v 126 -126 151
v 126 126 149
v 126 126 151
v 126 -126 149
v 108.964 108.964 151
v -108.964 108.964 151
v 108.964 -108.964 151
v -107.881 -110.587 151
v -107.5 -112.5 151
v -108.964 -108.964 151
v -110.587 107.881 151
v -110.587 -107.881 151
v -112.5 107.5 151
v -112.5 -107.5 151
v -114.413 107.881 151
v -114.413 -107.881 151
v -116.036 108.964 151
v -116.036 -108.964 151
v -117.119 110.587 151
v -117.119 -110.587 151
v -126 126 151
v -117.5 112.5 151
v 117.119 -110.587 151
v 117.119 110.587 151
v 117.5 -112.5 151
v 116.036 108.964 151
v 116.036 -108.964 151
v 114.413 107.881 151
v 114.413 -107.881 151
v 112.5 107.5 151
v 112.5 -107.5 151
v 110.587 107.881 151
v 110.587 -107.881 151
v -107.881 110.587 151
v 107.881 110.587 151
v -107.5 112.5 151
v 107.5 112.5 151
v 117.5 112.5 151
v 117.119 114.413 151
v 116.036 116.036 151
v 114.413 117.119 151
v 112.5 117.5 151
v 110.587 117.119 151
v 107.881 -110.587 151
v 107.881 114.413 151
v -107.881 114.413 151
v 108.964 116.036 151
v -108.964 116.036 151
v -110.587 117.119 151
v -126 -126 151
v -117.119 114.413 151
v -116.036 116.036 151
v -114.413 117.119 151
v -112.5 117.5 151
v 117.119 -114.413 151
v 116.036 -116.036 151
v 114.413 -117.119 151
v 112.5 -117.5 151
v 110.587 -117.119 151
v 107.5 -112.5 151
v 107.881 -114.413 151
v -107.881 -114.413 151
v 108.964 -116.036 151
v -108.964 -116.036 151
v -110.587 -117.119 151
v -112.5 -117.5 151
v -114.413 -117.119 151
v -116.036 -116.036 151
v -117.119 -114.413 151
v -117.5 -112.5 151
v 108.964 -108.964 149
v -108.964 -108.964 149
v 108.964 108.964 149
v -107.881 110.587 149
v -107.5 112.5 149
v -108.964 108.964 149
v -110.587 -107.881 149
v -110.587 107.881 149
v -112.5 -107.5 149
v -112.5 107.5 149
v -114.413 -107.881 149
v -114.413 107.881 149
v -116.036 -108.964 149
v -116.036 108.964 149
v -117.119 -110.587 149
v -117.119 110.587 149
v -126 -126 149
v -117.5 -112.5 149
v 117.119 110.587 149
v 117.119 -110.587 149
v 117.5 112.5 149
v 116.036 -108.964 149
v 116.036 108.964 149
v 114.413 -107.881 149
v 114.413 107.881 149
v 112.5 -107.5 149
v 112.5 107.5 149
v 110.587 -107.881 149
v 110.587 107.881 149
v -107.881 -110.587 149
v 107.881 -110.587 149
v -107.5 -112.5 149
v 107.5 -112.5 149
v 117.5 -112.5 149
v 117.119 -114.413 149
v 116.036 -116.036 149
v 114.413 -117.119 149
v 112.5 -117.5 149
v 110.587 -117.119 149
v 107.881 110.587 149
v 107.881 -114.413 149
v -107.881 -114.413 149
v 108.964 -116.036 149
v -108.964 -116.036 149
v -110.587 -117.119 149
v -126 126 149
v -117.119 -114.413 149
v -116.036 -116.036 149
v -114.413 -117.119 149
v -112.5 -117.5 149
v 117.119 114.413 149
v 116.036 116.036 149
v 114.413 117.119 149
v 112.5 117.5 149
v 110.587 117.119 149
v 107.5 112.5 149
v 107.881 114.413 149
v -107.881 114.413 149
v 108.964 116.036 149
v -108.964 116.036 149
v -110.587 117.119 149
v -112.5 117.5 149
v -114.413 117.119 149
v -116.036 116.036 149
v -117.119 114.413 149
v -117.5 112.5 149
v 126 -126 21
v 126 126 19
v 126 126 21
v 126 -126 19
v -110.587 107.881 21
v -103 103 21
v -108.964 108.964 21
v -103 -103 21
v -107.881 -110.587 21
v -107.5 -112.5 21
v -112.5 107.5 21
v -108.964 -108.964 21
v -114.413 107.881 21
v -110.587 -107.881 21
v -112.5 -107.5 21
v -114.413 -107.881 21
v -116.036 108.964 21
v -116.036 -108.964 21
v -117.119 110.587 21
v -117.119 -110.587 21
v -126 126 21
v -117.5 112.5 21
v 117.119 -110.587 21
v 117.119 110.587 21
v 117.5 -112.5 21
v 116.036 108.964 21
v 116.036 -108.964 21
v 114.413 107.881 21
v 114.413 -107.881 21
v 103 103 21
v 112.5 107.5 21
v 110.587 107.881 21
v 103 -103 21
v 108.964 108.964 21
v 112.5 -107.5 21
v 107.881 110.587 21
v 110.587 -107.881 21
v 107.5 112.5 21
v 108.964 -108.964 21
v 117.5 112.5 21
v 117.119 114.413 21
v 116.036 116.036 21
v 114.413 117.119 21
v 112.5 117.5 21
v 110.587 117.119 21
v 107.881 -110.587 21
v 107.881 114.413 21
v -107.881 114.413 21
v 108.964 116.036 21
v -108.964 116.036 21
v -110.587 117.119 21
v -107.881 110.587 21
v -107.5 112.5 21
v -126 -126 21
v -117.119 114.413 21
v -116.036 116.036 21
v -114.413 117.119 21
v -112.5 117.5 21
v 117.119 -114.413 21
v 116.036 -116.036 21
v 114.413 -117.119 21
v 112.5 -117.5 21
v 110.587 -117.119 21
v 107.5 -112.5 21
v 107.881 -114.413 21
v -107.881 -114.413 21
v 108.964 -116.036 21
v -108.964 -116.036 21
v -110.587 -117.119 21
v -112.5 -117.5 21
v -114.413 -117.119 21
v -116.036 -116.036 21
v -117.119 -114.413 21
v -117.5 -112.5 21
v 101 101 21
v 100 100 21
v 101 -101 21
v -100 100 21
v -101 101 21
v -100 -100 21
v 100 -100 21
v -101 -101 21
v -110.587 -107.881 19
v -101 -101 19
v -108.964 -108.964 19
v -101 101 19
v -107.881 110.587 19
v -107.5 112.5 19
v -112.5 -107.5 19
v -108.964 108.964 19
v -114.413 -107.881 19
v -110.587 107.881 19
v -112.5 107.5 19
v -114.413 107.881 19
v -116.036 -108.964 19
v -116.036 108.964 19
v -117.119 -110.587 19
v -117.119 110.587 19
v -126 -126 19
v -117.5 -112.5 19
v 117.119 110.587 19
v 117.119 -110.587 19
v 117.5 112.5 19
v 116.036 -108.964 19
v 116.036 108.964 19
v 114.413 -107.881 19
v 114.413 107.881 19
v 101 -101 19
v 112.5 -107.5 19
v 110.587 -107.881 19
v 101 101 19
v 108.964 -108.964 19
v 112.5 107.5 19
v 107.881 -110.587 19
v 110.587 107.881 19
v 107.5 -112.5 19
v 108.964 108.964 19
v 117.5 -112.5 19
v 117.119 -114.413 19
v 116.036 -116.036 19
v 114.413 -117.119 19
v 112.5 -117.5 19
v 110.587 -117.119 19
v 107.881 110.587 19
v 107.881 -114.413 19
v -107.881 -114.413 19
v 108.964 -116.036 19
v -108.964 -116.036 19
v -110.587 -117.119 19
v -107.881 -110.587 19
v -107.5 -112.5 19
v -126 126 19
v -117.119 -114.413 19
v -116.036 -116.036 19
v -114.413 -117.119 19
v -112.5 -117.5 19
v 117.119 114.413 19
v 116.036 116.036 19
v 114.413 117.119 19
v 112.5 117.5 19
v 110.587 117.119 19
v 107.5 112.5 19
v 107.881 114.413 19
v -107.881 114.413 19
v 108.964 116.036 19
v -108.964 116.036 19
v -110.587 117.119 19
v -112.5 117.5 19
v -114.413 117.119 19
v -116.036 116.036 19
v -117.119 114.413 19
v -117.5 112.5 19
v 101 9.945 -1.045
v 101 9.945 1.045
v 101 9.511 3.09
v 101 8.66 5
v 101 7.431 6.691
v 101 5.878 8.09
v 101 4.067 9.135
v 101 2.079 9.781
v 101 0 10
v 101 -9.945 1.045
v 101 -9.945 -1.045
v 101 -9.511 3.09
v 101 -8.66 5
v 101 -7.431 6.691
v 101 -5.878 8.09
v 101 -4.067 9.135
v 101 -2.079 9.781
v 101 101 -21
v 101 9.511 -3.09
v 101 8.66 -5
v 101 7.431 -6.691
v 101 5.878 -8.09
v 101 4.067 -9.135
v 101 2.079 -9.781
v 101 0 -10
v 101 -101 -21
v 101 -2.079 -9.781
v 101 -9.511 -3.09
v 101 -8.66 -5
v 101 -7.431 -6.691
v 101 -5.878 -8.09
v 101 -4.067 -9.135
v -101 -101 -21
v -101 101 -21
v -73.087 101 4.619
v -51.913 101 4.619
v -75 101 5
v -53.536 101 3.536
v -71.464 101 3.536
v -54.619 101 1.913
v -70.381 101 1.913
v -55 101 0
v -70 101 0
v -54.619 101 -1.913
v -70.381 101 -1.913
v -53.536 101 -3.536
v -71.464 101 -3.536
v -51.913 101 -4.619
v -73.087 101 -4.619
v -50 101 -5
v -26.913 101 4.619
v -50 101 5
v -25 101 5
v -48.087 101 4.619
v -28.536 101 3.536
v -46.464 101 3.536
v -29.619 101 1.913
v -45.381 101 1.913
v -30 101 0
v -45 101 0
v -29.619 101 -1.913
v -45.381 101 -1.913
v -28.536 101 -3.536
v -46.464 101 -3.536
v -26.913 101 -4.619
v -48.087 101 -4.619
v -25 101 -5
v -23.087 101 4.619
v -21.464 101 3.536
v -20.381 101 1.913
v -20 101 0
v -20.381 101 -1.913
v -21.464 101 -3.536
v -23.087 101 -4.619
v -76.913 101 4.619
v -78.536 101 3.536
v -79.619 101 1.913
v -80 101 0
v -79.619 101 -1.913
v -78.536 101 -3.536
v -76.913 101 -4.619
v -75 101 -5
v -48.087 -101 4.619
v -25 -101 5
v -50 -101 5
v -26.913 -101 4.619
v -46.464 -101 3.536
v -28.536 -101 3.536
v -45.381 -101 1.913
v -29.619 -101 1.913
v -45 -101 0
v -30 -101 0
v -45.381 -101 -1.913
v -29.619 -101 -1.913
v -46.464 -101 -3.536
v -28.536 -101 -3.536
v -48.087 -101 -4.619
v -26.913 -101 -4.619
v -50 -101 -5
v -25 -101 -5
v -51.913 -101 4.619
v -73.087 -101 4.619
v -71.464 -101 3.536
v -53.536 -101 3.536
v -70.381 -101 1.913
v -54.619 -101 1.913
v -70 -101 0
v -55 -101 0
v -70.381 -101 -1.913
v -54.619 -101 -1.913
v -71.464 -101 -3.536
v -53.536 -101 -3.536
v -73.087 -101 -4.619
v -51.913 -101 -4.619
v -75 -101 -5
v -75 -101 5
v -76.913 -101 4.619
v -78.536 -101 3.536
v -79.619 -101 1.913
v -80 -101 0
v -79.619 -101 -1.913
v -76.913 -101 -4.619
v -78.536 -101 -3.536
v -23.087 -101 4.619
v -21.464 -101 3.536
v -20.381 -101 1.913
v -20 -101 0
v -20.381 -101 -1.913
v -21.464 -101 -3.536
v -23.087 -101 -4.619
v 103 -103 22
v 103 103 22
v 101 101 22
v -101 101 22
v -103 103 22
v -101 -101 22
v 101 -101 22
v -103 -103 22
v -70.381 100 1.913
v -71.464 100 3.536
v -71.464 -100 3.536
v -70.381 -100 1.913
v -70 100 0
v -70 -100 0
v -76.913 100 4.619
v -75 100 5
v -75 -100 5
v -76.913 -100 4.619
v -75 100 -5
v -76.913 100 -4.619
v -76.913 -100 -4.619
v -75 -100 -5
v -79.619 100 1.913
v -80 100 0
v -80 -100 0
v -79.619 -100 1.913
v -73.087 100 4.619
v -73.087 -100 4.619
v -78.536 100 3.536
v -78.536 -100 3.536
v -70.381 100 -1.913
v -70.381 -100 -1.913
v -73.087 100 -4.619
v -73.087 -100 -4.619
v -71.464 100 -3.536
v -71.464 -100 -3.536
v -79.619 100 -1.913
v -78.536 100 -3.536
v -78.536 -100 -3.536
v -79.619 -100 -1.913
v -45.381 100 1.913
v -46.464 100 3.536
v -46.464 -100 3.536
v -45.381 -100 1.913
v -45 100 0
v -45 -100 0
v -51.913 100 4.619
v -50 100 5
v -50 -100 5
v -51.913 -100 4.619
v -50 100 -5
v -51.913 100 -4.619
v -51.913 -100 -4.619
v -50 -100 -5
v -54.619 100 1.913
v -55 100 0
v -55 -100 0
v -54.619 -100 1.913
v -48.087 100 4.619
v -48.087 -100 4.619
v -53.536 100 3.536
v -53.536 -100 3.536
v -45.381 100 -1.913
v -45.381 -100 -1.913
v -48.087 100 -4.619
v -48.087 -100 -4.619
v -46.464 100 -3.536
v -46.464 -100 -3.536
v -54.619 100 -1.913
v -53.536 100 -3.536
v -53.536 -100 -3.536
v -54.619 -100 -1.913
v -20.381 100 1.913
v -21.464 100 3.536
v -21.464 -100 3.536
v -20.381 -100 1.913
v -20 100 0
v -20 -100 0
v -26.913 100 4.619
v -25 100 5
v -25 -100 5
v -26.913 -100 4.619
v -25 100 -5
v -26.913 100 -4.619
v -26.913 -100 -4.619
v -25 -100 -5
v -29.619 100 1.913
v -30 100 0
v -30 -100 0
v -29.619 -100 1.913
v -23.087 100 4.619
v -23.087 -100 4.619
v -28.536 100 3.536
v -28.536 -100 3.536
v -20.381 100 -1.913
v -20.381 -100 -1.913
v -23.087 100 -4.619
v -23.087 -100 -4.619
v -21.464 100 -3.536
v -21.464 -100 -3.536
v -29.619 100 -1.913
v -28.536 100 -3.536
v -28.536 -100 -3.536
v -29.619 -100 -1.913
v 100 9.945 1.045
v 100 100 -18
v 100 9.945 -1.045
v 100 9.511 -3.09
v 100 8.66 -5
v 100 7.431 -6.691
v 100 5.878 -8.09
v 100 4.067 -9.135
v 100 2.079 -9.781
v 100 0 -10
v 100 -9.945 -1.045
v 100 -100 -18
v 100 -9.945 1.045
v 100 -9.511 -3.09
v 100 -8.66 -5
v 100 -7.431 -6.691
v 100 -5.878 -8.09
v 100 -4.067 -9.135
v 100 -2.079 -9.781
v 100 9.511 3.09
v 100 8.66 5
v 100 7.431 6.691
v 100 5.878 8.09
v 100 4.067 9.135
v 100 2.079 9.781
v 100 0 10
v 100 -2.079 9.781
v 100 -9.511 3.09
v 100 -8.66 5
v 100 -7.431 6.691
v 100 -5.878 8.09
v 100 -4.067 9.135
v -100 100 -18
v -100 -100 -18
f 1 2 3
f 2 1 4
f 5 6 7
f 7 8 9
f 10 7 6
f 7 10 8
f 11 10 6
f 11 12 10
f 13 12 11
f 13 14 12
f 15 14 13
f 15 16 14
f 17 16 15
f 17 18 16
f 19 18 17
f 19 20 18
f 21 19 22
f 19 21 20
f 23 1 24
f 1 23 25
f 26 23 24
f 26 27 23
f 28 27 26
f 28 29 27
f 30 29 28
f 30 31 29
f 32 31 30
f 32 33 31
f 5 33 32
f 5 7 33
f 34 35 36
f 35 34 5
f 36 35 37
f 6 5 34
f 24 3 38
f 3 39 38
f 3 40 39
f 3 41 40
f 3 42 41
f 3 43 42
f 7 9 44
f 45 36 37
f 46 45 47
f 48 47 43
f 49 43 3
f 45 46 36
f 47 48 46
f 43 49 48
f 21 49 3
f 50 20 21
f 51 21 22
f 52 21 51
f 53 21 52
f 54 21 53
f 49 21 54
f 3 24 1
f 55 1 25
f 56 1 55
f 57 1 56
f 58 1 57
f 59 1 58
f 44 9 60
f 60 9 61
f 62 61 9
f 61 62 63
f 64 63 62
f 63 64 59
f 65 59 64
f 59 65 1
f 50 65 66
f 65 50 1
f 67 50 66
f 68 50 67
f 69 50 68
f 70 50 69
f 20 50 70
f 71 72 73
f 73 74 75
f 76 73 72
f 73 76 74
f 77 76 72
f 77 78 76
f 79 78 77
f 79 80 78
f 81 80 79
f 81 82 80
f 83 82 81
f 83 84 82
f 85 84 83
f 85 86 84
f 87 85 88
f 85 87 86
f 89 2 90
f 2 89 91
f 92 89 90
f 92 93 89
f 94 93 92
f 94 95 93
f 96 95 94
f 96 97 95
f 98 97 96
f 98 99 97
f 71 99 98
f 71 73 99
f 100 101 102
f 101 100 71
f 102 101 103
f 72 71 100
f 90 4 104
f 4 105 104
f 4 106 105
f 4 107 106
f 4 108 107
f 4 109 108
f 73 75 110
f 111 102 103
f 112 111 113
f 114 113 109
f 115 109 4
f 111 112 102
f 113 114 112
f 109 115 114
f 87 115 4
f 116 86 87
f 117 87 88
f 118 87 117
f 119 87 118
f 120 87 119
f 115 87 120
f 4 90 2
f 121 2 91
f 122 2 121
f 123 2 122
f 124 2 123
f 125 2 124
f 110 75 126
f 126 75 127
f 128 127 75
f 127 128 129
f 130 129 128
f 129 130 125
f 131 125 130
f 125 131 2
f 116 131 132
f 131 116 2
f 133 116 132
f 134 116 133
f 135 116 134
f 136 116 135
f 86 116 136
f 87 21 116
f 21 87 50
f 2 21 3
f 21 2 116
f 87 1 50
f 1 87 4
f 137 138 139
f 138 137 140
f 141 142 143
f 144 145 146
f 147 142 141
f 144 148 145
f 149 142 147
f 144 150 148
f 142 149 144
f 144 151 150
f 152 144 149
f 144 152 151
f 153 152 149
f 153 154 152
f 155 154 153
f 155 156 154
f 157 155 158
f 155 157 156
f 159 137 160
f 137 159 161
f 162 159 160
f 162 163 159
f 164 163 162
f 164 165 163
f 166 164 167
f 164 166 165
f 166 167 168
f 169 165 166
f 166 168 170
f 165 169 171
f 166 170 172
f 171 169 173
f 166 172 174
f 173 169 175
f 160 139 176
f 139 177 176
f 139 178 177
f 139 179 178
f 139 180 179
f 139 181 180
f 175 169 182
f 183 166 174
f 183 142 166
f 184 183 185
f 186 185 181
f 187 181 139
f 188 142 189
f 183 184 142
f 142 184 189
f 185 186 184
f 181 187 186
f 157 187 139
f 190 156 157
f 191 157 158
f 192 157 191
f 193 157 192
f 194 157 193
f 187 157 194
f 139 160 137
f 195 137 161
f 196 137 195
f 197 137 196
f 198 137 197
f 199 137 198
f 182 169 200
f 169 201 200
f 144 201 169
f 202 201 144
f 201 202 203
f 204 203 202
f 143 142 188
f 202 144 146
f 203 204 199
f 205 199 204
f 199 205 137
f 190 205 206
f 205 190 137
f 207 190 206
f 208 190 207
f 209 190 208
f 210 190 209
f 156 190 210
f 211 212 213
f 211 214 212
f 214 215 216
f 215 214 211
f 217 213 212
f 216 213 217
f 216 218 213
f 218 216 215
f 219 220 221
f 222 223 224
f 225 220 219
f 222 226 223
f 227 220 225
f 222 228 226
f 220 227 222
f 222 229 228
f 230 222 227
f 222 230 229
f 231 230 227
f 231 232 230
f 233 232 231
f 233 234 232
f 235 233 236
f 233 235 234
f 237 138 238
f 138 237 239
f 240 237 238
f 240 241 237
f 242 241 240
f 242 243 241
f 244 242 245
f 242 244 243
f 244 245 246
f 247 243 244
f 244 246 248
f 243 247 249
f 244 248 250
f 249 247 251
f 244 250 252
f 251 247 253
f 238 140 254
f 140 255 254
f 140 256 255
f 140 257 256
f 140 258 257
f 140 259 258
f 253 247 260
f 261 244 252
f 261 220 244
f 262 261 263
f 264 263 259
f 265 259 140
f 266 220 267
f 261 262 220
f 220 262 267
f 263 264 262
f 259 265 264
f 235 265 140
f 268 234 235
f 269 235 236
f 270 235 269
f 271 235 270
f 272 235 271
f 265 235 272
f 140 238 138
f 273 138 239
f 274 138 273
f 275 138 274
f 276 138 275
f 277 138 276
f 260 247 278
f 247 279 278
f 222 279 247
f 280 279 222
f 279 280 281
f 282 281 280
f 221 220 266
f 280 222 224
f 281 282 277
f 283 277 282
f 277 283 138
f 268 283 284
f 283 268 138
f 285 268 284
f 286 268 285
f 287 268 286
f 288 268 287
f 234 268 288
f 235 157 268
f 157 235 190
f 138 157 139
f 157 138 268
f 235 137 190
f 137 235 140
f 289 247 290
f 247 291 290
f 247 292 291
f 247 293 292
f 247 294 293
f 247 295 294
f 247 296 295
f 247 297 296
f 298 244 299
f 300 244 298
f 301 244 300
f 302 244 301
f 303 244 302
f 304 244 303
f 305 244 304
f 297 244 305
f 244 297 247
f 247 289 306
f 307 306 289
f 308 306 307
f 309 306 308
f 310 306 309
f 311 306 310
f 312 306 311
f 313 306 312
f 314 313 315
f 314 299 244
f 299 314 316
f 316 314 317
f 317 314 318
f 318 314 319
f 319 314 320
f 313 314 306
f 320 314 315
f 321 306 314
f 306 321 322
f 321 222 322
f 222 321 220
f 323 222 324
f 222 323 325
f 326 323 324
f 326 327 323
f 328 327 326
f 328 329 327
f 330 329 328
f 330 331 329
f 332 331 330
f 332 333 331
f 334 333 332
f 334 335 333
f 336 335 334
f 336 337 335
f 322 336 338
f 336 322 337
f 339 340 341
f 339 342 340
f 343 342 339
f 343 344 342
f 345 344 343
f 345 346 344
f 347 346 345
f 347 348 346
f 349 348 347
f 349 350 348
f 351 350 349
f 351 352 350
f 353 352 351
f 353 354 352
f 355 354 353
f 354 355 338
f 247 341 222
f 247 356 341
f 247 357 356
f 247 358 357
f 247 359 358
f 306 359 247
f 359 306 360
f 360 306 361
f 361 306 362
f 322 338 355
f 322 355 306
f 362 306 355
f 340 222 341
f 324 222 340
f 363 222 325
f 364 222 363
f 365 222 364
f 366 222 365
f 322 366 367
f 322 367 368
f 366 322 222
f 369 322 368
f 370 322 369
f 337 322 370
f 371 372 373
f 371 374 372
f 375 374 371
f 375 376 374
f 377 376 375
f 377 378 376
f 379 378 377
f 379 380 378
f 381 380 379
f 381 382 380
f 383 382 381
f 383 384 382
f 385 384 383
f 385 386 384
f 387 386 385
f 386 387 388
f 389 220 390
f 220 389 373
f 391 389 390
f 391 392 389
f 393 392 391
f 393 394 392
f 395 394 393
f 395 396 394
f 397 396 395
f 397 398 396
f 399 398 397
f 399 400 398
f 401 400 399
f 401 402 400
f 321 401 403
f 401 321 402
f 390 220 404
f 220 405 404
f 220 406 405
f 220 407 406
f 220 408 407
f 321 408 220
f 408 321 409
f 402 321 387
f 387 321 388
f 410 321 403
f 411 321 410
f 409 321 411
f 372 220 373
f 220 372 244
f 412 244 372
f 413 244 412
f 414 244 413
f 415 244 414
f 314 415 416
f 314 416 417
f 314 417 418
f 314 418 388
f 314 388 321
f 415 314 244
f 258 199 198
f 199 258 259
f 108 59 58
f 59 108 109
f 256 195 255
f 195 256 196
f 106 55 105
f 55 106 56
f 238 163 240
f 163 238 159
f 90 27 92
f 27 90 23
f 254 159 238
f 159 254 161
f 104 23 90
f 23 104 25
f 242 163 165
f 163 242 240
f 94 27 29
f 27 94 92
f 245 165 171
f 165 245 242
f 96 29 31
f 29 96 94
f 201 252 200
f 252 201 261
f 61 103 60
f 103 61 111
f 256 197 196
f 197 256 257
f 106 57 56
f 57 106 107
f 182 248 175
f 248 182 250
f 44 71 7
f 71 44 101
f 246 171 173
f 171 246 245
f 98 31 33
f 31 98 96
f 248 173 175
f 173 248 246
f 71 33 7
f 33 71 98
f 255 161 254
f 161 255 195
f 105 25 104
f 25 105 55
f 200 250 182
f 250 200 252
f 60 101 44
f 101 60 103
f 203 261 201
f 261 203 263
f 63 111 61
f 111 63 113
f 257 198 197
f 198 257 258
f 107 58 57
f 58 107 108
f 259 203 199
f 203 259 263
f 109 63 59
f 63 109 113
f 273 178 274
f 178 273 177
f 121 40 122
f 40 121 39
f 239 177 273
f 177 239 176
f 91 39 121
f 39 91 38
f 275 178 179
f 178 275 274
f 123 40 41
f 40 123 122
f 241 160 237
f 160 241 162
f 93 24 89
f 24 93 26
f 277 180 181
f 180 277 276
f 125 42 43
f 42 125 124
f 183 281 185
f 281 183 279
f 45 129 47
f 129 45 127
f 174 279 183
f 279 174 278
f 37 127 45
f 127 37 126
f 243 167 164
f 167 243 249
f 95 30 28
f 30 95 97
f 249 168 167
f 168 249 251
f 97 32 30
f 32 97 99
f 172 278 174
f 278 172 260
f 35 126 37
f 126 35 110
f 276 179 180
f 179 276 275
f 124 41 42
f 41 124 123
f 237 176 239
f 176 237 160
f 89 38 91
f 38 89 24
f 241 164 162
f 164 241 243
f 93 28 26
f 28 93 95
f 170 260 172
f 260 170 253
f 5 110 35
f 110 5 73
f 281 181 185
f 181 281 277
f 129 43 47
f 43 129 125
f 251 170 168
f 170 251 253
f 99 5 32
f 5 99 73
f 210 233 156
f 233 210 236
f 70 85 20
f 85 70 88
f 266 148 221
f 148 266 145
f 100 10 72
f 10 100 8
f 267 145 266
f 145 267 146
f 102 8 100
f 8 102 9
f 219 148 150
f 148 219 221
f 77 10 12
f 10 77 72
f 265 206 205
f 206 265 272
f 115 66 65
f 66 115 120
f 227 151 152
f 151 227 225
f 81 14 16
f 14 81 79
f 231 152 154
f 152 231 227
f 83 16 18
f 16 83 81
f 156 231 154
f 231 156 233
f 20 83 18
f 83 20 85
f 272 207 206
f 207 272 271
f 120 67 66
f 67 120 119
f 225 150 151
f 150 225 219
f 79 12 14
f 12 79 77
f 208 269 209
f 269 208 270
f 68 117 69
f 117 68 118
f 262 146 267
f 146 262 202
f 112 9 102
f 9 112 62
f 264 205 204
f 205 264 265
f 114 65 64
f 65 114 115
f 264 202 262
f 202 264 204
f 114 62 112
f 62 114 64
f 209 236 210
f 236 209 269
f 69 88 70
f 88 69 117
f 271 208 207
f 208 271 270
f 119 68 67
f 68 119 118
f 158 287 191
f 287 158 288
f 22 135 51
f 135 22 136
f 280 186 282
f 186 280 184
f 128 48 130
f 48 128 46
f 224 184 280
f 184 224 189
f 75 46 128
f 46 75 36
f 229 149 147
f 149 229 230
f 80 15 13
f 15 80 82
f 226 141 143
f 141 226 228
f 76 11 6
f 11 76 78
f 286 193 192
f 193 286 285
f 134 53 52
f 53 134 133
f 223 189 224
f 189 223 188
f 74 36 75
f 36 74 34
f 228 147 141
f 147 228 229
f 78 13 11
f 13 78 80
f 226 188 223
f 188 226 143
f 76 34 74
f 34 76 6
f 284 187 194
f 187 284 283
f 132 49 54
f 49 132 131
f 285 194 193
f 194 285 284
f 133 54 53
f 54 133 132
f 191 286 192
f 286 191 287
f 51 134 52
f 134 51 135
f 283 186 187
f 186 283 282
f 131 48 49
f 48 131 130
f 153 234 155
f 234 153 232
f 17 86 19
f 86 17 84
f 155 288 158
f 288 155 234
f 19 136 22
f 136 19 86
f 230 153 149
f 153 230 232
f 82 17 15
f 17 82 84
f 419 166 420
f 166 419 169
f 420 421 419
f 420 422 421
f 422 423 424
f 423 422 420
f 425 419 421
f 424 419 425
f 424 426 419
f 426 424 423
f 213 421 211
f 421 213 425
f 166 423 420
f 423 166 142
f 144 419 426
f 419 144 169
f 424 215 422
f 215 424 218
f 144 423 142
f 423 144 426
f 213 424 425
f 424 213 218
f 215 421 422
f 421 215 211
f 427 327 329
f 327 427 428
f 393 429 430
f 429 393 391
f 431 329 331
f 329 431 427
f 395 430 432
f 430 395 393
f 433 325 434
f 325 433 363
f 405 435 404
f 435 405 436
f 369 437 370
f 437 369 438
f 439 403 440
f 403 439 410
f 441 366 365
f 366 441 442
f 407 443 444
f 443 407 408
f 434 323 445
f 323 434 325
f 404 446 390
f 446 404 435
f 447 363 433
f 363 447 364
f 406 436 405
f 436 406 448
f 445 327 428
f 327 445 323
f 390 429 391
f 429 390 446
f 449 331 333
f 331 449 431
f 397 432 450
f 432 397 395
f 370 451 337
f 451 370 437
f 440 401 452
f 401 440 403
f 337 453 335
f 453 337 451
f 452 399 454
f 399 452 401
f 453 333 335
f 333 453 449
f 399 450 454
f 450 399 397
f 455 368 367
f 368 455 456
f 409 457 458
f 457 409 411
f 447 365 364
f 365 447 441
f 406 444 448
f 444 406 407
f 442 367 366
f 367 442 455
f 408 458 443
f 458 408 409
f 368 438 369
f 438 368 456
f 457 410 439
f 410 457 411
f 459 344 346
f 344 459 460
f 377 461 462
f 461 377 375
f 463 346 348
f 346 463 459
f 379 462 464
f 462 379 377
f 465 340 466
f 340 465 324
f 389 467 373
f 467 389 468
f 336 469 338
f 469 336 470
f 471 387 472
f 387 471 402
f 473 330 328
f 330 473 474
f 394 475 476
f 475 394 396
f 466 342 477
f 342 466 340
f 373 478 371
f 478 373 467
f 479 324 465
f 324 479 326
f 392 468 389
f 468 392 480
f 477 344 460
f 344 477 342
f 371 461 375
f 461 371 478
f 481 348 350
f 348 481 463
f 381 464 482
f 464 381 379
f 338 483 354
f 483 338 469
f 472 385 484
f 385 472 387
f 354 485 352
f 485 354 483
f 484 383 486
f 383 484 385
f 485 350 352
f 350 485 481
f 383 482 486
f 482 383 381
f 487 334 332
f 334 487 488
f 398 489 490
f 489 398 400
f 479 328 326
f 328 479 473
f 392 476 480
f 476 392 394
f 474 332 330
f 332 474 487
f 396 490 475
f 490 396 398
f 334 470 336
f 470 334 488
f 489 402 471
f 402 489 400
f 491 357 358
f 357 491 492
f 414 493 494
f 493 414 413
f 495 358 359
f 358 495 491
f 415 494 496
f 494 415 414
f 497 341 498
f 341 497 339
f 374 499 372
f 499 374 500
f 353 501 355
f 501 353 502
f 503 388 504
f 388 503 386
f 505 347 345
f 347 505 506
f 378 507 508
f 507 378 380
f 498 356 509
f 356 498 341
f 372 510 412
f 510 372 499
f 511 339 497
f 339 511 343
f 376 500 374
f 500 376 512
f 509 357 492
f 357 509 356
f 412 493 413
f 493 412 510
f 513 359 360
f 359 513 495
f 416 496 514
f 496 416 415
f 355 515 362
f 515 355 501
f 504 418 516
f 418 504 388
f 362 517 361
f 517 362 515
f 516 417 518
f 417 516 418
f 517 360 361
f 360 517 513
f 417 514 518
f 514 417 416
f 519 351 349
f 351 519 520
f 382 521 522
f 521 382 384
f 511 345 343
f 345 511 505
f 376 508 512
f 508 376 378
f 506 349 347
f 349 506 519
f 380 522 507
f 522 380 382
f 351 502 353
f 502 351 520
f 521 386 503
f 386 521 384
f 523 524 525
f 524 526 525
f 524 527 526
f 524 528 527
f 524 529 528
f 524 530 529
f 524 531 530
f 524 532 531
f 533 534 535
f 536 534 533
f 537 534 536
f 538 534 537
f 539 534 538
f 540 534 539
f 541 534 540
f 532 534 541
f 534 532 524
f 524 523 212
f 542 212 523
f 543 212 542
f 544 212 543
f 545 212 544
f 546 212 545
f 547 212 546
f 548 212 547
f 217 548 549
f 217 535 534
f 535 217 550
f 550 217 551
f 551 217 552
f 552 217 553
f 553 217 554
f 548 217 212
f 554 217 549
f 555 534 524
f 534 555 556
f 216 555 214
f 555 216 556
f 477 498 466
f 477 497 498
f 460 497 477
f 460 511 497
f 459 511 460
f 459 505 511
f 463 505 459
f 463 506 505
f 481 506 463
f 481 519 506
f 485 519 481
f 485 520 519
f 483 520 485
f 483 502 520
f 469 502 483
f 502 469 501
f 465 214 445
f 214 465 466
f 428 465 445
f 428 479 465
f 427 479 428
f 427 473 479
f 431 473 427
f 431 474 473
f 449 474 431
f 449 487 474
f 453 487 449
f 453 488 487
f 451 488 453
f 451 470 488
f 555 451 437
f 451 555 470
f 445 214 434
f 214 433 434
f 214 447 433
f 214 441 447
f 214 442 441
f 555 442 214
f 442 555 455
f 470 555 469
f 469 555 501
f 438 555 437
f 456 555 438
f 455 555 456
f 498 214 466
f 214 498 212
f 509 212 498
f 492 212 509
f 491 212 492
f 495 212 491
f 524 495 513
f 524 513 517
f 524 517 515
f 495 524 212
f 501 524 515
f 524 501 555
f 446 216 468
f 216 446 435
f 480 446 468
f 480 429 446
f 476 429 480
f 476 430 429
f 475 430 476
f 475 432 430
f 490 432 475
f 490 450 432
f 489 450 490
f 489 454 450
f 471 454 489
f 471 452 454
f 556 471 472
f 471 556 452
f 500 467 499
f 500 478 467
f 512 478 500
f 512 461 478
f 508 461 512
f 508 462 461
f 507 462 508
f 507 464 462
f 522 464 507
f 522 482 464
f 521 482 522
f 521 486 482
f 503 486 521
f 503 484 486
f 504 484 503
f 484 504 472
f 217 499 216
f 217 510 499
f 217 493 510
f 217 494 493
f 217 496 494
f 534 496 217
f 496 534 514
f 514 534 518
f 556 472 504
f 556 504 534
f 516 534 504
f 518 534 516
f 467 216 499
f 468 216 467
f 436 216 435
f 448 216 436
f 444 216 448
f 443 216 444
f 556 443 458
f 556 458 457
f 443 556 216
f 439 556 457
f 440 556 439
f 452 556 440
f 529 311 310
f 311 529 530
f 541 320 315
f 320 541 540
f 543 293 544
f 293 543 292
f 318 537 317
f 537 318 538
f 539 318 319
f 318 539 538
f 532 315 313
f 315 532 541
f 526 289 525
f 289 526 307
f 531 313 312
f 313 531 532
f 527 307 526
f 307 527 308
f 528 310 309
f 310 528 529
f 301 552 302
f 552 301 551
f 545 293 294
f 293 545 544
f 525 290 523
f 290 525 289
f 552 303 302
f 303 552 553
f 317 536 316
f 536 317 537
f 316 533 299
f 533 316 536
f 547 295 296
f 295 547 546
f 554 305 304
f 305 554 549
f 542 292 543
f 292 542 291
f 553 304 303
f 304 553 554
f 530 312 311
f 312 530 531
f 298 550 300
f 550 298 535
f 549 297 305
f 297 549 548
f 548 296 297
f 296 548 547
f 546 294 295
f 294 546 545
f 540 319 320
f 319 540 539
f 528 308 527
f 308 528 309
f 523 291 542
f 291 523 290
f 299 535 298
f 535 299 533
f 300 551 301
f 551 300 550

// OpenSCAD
dimx = 200;
dimy = 200;
dimz = 40;
flange = 25;
thickness = 2;

module smaholes(r_sma=5){
	translate([-75,0,0])rotate([90,0,0]) cylinder(r=r_sma,h=300, center=true);
	translate([-50,0,0])rotate([90,0,0]) cylinder(r=r_sma,h=300, center=true);
	translate([-25,0,0])rotate([90,0,0]) cylinder(r=r_sma,h=300, center=true);
}

module cat6_hole(r_cat=10){
	translate([80,0,0])rotate([0,90,0]) cylinder(r=r_cat,h=100, center=true);

}
//cat6_hole();
//smaholes();

module mountholes(){
	translate([(dimx+flange)/2,-(dimy+flange)/2,0]) cylinder(r=5,h=800, center=true);
	translate([(dimx+flange)/2, (dimy+flange)/2,0]) cylinder(r=5,h=800, center=true);
	translate([-(dimx+flange)/2,-(dimy+flange)/2,0]) cylinder(r=5,h=800, center=true);
	translate([-(dimx+flange)/2, (dimy+flange)/2,0]) cylinder(r=5,h=800, center=true);
}


module flange(){
   translate([dimx/2+2,0,dimz/2+1])    cube([2,dimy+6,2], center=true);
   translate([-(dimx/2+2),0,dimz/2+1]) cube([2,dimy+6,2], center=true);
   translate([0,-(dimx/2+2),dimz/2+1]) cube([dimy+6,2,2], center=true);
   translate([0,(dimx/2+2),dimz/2+1])  cube([dimy+6,2,2], center=true);
}



difference(){
	color("LightSteelBlue") union(){
		translate([0,0,150]) cube([dimx+2+2*flange,dimy+thickness+2*flange,thickness], center=true);

      translate([0,0,dimz/2]) cube([dimx+2+2*flange,dimy+thickness+2*flange,thickness], center=true);
		cube([dimx+thickness,dimy+thickness,dimz+thickness], center=true);
      
	};
	color("White") translate([0,0,thickness]) cube([dimx,dimy,dimz], center=true);
   color("White") mountholes();
	flange();
	color("White") smaholes();
	color("White") cat6_hole();

};

color("DimGray", a=0.3) flange();
